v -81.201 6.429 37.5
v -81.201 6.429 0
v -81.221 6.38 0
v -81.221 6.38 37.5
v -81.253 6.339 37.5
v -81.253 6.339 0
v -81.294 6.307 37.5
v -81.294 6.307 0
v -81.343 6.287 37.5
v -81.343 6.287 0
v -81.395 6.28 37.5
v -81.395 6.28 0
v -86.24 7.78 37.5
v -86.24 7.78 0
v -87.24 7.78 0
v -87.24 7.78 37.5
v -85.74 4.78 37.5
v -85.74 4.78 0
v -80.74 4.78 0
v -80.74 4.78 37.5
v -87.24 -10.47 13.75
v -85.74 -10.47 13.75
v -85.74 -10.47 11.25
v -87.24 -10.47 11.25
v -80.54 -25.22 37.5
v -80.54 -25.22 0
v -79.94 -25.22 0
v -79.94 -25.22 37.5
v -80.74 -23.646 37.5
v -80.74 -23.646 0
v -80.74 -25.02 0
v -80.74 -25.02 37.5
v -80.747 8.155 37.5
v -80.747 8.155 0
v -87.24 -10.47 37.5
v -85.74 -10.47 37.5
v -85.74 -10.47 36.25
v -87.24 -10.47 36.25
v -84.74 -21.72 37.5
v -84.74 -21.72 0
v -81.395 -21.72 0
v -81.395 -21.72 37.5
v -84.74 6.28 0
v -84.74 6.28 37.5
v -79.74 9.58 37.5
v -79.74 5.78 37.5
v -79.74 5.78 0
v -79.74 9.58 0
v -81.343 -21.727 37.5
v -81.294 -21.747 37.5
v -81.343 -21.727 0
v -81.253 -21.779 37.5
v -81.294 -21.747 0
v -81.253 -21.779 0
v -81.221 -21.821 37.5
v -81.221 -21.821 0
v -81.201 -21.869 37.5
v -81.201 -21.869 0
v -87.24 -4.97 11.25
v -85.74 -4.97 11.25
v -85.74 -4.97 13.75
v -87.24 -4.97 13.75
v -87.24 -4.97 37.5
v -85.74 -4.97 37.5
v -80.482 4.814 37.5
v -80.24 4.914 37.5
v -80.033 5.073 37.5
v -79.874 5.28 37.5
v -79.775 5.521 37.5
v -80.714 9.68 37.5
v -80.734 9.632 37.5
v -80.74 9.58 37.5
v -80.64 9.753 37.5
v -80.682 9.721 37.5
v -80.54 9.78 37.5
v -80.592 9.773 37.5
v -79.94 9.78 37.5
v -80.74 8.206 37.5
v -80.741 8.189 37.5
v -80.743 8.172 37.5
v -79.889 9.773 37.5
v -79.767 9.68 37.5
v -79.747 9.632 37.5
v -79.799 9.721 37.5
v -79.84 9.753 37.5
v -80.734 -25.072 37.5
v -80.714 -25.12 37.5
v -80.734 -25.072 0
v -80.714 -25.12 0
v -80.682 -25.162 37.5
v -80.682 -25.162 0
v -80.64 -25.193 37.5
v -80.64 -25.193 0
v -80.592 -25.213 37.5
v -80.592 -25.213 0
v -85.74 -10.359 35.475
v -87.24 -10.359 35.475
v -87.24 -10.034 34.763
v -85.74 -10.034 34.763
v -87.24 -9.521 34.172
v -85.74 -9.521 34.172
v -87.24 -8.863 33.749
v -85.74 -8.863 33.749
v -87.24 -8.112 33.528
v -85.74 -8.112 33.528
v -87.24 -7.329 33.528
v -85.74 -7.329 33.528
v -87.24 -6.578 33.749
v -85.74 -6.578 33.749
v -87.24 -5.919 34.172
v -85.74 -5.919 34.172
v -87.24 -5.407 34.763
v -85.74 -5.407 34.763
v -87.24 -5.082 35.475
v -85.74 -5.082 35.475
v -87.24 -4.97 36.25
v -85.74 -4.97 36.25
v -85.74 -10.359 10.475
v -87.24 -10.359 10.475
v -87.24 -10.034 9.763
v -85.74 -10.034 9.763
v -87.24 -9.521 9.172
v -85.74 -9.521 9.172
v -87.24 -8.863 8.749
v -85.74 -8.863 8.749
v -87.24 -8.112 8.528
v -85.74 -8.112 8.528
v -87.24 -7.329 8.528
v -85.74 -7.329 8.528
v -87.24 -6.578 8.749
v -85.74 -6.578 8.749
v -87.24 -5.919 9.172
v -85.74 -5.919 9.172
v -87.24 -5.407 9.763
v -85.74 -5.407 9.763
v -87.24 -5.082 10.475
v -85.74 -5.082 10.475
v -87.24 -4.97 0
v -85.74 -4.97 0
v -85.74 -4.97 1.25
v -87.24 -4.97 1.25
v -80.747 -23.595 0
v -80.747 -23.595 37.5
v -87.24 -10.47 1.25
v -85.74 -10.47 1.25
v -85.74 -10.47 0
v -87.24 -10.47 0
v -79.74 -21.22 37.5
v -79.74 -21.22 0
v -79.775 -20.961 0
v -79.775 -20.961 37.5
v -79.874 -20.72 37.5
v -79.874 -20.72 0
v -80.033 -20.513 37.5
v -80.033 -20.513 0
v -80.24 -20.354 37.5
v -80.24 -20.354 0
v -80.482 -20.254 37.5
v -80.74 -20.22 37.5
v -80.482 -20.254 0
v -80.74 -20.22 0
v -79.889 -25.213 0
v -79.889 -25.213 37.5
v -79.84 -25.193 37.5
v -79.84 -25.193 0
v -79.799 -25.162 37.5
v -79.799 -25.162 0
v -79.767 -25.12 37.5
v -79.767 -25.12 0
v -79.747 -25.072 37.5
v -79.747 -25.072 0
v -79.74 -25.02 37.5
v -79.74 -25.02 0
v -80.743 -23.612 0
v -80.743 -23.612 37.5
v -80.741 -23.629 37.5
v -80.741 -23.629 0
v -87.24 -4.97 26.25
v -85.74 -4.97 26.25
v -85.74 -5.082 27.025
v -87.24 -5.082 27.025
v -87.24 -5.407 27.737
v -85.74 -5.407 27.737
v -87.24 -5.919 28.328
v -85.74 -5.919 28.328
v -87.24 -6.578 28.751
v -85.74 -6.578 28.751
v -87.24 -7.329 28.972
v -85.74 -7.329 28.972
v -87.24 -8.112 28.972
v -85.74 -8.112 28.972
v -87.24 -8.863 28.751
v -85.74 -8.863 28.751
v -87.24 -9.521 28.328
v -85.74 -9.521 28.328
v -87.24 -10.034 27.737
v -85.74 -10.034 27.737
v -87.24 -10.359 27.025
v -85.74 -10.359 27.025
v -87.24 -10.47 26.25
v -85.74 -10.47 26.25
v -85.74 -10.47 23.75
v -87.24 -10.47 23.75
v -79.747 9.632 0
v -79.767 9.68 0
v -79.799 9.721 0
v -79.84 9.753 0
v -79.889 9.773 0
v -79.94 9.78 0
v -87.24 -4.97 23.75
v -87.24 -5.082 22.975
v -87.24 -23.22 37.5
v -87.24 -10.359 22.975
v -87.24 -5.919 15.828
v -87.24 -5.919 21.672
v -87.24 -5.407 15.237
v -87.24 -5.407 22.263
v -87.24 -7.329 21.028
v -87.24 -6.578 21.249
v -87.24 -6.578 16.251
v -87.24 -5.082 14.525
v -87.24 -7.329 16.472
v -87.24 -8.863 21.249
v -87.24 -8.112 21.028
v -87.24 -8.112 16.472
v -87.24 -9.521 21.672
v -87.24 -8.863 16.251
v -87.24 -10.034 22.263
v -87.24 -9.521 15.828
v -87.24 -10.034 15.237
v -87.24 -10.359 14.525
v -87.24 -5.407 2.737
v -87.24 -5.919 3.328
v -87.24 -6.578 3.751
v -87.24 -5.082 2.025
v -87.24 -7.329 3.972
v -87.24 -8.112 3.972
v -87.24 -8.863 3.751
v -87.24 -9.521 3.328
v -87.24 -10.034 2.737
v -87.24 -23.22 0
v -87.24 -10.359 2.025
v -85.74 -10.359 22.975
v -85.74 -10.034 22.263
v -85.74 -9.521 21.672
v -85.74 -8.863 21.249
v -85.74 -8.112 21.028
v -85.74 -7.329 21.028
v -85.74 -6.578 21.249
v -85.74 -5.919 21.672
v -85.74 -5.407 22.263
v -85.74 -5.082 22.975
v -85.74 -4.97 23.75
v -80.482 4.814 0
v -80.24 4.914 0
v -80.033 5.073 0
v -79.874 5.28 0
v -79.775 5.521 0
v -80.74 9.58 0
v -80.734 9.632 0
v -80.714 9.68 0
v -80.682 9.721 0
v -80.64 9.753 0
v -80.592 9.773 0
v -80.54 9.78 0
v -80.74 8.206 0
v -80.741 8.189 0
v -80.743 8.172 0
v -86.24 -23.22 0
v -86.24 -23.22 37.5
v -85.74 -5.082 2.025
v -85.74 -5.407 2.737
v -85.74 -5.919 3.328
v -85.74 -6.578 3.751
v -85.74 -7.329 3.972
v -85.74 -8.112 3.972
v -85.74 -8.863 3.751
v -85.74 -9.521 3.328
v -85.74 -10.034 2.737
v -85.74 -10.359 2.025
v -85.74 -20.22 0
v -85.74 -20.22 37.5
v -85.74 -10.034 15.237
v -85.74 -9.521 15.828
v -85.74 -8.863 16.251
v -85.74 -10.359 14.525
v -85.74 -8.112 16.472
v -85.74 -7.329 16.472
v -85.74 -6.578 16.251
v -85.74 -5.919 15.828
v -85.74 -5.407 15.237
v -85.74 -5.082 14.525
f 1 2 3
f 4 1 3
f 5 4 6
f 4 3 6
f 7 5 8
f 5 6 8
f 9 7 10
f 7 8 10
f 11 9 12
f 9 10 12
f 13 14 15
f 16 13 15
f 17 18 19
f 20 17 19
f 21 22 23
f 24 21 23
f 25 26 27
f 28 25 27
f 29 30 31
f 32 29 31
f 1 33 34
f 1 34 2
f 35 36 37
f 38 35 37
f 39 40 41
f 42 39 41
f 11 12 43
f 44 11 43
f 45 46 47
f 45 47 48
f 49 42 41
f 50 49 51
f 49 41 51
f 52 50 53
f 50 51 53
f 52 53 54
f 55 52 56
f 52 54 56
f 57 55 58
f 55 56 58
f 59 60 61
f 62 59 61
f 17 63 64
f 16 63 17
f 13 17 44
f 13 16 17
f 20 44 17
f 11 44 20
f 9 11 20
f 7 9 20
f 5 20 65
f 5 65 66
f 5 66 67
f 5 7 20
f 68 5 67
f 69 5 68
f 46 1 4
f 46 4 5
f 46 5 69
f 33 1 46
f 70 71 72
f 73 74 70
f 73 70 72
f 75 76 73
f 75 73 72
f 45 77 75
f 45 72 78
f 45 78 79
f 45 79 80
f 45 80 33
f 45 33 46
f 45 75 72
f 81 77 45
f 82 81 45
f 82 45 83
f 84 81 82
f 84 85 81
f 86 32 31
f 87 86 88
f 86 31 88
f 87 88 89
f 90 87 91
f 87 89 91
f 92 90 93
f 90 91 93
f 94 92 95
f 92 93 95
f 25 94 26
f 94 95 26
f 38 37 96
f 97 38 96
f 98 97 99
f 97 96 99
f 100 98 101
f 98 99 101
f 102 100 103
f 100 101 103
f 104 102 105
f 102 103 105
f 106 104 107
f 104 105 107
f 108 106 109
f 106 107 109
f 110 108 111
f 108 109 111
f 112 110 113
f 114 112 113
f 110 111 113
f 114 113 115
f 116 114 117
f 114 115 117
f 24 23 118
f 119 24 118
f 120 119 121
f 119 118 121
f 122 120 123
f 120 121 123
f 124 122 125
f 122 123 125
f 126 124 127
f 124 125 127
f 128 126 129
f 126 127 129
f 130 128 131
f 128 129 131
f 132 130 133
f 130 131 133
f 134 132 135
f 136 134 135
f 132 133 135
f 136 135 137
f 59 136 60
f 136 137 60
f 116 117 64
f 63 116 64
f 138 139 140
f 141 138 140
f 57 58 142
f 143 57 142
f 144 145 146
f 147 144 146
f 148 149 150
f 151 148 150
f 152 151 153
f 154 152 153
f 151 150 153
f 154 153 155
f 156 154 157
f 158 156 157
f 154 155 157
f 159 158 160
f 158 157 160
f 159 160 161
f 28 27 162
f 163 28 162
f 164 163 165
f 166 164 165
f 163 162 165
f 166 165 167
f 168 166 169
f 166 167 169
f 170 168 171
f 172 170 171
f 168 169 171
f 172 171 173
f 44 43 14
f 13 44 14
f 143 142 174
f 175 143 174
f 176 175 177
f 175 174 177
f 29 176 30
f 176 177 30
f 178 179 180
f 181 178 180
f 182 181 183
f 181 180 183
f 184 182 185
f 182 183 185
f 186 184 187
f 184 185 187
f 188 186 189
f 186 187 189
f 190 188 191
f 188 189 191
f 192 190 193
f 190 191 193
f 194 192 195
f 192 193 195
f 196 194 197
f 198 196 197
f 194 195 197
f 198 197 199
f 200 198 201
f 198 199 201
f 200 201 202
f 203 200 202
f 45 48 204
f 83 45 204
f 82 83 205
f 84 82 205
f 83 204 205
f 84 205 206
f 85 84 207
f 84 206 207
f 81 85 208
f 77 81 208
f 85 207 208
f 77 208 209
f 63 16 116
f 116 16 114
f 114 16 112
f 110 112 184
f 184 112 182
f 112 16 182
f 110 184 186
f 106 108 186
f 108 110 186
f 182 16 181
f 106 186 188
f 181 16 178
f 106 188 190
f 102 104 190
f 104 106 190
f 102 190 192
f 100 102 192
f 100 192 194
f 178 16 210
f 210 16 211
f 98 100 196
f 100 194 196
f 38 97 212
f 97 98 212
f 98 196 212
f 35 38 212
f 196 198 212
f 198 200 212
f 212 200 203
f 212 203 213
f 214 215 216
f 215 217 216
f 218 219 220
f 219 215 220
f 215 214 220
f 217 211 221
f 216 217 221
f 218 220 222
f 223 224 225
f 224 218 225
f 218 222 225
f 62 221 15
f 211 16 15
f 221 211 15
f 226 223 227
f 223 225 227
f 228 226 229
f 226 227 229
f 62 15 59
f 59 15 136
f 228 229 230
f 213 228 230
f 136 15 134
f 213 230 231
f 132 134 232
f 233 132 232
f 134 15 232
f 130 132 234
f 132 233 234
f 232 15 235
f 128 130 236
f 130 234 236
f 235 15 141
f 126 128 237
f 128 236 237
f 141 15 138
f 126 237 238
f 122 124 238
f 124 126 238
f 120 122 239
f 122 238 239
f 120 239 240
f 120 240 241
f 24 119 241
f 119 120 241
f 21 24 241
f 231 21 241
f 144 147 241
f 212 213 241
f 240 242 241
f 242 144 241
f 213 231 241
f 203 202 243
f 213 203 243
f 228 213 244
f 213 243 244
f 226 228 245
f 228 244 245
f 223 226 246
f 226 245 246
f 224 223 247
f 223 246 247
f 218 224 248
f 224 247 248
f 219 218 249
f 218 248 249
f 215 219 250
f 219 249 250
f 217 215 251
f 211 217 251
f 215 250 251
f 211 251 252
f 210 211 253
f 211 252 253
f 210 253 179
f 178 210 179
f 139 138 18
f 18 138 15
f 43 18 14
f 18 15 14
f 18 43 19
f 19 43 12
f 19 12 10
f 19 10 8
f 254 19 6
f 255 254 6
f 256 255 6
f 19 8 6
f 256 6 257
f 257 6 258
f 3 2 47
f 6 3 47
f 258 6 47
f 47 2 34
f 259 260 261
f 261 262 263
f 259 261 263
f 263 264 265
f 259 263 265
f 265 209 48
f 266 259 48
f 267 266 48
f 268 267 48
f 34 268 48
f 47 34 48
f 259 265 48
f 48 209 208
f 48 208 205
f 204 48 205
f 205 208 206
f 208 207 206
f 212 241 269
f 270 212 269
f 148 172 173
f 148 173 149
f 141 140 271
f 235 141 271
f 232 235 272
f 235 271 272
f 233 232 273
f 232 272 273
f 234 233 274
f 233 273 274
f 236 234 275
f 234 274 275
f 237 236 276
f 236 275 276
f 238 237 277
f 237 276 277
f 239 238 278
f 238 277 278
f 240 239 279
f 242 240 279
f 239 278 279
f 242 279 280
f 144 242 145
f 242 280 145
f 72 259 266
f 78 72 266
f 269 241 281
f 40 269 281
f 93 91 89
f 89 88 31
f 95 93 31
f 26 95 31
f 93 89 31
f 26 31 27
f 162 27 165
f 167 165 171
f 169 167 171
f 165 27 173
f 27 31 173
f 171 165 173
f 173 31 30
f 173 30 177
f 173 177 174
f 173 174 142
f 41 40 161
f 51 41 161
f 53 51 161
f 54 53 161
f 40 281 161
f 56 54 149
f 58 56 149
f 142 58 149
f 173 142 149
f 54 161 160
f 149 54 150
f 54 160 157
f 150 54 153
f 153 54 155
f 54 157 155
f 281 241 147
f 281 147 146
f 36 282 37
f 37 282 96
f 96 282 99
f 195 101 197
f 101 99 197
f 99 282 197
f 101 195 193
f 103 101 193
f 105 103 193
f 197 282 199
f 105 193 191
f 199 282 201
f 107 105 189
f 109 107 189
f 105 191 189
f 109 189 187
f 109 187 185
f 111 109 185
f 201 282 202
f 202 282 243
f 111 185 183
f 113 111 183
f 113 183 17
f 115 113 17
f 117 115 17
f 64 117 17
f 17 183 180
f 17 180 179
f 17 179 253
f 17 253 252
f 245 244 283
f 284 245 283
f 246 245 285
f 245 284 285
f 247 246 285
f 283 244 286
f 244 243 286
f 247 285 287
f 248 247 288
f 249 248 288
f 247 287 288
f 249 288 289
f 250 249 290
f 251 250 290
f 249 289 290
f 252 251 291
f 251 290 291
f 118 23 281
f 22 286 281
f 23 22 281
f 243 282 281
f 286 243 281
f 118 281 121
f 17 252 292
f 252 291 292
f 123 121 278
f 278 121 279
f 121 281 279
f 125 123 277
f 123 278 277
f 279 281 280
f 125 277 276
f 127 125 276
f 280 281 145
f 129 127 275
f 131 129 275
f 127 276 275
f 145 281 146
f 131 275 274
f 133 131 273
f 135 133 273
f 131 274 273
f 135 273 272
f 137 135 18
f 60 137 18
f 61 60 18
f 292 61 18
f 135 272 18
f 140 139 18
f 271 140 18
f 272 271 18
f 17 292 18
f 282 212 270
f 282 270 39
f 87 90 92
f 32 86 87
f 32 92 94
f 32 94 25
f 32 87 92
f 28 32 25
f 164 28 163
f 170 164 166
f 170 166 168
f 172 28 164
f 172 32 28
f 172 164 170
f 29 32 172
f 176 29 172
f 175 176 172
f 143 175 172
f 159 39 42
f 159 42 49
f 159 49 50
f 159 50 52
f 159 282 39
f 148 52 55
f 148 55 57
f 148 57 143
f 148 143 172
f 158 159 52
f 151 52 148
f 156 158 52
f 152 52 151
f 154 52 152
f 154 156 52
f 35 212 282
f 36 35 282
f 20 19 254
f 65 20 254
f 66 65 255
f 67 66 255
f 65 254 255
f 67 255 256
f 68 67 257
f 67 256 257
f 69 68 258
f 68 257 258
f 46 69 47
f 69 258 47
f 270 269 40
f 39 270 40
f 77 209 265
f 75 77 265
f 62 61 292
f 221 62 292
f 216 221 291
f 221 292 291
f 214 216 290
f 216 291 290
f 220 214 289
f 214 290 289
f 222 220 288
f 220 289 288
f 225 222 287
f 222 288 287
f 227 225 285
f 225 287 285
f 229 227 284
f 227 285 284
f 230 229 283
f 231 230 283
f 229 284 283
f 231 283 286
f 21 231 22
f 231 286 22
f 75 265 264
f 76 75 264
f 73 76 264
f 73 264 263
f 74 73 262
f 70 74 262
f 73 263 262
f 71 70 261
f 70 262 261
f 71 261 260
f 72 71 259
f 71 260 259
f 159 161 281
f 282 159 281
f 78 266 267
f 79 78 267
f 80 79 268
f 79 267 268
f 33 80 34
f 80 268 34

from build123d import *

# Parameters (mm, degrees)
F1_DEPTH = 37.5
F3_DEPTH = 25


# Not quite as in the source:
# - ends of sketch curves that miss each other by under 0.0002 mm in the source are joined


with BuildPart() as f1:
    # F0 (on Top) → F1 (new body)
    with BuildSketch(Plane.XY):
        with BuildLine():
            Line((-87.240451, 4.779809), (-87.240451, -5.411983))
            Line((-87.240451, -5.411983), (-87.240451, -7.720191))
            Line((-87.240451, -7.720191), (-87.240451, -17.023544))
            Line((-87.240451, -17.023544), (-87.240451, -20.220191))
            Line((-87.240451, -20.220191), (-87.240451, -23.220191))
            Line((-87.240451, -23.220191), (-86.240451, -23.220191))
            Line((-86.240451, -23.220191), (-84.740451, -21.720191))
            Line((-84.740451, -21.720191), (-81.394629, -21.720191))
            ThreePointArc((-81.394629, -21.720191), (-81.2725220613, -21.7617930975), (-81.2012141703, -21.8692920448))
            Line((-81.2012141703, -21.8692920448), (-80.747036, -23.595168))
            ThreePointArc((-80.747036, -23.595168), (-80.7421040626, -23.6204048929), (-80.740451, -23.646066))
            Line((-80.740451, -23.646066), (-80.740451, -25.020191))
            ThreePointArc((-80.740451, -25.020191), (-80.6818723562, -25.1616123562), (-80.540451, -25.220191))
            Line((-80.540451, -25.220191), (-79.940451, -25.220191))
            ThreePointArc((-79.940451, -25.220191), (-79.7990296438, -25.1616123562), (-79.740451, -25.020191))
            Line((-79.740451, -25.020191), (-79.740451, -21.220191))
            ThreePointArc((-79.740451, -21.220191), (-80.0333442188, -20.5130842188), (-80.740451, -20.220191))
            Line((-80.740451, -20.220191), (-85.740451, -20.220191))
            Line((-85.740451, -20.220191), (-85.740451, -7.720191))
            Line((-85.740451, -7.720191), (-85.740451, 4.779809))
            Line((-85.740451, 4.779809), (-80.740451, 4.779809))
            ThreePointArc((-80.740451, 4.779809), (-80.0333442188, 5.0727022188), (-79.740451, 5.779809))
            Line((-79.740451, 5.779809), (-79.740451, 9.579809))
            ThreePointArc((-79.740451, 9.579809), (-79.7990296438, 9.7212303562), (-79.940451, 9.779809))
            Line((-79.940451, 9.779809), (-80.540451, 9.779809))
            ThreePointArc((-80.540451, 9.779809), (-80.6818723562, 9.7212303562), (-80.740451, 9.579809))
            Line((-80.740451, 9.579809), (-80.740451, 8.205684))
            ThreePointArc((-80.740451, 8.205684), (-80.7421040626, 8.1800228929), (-80.7470359242, 8.15478598))
            Line((-80.7470359242, 8.15478598), (-81.201214, 6.42891))
            ThreePointArc((-81.201214, 6.42891), (-81.2725220613, 6.3214110975), (-81.394629, 6.279809))
            Line((-81.394629, 6.279809), (-84.740451, 6.279809))
            Line((-84.740451, 6.279809), (-86.240451, 7.779809))
            Line((-86.240451, 7.779809), (-87.240451, 7.779809))
            Line((-87.240451, 7.779809), (-87.240451, 4.779809))
        make_face()
    extrude(amount=F1_DEPTH)

    # F2 (on face) → F3 (cut)
    with BuildSketch(Plane.YZ.offset(-85.740451)):
        with BuildLine():
            ThreePointArc((-10.470191, 23.75), (-7.720191, 21), (-4.970191, 23.75))
            Line((-4.970191, 23.75), (-4.970191, 26.25))
            ThreePointArc((-4.970191, 26.25), (-7.720191, 29), (-10.470191, 26.25))
            Line((-10.470191, 26.25), (-10.470191, 23.75))
        make_face()
        with BuildLine():
            Line((-4.970191, 11.25), (-4.970191, 13.75))
            ThreePointArc((-4.970191, 13.75), (-7.720191, 16.5), (-10.470191, 13.75))
            Line((-10.470191, 13.75), (-10.470191, 11.25))
            ThreePointArc((-10.470191, 11.25), (-7.720191, 8.5), (-4.970191, 11.25))
        make_face()
        with BuildLine():
            Line((-4.970191, -1.25), (-4.970191, 1.25))
            ThreePointArc((-4.970191, 1.25), (-7.720191, 4), (-10.470191, 1.25))
            Line((-10.470191, 1.25), (-10.470191, -1.25))
            ThreePointArc((-10.470191, -1.25), (-7.720191, -4), (-4.970191, -1.25))
        make_face()
        with BuildLine():
            Line((-4.970191, 36.25), (-4.970191, 38.75))
            ThreePointArc((-4.970191, 38.75), (-7.720191, 41.5), (-10.470191, 38.75))
            Line((-10.470191, 38.75), (-10.470191, 36.25))
            ThreePointArc((-10.470191, 36.25), (-7.720191, 33.5), (-4.970191, 36.25))
        make_face()
    extrude(amount=-F3_DEPTH, mode=Mode.SUBTRACT)


solid = f1.part
